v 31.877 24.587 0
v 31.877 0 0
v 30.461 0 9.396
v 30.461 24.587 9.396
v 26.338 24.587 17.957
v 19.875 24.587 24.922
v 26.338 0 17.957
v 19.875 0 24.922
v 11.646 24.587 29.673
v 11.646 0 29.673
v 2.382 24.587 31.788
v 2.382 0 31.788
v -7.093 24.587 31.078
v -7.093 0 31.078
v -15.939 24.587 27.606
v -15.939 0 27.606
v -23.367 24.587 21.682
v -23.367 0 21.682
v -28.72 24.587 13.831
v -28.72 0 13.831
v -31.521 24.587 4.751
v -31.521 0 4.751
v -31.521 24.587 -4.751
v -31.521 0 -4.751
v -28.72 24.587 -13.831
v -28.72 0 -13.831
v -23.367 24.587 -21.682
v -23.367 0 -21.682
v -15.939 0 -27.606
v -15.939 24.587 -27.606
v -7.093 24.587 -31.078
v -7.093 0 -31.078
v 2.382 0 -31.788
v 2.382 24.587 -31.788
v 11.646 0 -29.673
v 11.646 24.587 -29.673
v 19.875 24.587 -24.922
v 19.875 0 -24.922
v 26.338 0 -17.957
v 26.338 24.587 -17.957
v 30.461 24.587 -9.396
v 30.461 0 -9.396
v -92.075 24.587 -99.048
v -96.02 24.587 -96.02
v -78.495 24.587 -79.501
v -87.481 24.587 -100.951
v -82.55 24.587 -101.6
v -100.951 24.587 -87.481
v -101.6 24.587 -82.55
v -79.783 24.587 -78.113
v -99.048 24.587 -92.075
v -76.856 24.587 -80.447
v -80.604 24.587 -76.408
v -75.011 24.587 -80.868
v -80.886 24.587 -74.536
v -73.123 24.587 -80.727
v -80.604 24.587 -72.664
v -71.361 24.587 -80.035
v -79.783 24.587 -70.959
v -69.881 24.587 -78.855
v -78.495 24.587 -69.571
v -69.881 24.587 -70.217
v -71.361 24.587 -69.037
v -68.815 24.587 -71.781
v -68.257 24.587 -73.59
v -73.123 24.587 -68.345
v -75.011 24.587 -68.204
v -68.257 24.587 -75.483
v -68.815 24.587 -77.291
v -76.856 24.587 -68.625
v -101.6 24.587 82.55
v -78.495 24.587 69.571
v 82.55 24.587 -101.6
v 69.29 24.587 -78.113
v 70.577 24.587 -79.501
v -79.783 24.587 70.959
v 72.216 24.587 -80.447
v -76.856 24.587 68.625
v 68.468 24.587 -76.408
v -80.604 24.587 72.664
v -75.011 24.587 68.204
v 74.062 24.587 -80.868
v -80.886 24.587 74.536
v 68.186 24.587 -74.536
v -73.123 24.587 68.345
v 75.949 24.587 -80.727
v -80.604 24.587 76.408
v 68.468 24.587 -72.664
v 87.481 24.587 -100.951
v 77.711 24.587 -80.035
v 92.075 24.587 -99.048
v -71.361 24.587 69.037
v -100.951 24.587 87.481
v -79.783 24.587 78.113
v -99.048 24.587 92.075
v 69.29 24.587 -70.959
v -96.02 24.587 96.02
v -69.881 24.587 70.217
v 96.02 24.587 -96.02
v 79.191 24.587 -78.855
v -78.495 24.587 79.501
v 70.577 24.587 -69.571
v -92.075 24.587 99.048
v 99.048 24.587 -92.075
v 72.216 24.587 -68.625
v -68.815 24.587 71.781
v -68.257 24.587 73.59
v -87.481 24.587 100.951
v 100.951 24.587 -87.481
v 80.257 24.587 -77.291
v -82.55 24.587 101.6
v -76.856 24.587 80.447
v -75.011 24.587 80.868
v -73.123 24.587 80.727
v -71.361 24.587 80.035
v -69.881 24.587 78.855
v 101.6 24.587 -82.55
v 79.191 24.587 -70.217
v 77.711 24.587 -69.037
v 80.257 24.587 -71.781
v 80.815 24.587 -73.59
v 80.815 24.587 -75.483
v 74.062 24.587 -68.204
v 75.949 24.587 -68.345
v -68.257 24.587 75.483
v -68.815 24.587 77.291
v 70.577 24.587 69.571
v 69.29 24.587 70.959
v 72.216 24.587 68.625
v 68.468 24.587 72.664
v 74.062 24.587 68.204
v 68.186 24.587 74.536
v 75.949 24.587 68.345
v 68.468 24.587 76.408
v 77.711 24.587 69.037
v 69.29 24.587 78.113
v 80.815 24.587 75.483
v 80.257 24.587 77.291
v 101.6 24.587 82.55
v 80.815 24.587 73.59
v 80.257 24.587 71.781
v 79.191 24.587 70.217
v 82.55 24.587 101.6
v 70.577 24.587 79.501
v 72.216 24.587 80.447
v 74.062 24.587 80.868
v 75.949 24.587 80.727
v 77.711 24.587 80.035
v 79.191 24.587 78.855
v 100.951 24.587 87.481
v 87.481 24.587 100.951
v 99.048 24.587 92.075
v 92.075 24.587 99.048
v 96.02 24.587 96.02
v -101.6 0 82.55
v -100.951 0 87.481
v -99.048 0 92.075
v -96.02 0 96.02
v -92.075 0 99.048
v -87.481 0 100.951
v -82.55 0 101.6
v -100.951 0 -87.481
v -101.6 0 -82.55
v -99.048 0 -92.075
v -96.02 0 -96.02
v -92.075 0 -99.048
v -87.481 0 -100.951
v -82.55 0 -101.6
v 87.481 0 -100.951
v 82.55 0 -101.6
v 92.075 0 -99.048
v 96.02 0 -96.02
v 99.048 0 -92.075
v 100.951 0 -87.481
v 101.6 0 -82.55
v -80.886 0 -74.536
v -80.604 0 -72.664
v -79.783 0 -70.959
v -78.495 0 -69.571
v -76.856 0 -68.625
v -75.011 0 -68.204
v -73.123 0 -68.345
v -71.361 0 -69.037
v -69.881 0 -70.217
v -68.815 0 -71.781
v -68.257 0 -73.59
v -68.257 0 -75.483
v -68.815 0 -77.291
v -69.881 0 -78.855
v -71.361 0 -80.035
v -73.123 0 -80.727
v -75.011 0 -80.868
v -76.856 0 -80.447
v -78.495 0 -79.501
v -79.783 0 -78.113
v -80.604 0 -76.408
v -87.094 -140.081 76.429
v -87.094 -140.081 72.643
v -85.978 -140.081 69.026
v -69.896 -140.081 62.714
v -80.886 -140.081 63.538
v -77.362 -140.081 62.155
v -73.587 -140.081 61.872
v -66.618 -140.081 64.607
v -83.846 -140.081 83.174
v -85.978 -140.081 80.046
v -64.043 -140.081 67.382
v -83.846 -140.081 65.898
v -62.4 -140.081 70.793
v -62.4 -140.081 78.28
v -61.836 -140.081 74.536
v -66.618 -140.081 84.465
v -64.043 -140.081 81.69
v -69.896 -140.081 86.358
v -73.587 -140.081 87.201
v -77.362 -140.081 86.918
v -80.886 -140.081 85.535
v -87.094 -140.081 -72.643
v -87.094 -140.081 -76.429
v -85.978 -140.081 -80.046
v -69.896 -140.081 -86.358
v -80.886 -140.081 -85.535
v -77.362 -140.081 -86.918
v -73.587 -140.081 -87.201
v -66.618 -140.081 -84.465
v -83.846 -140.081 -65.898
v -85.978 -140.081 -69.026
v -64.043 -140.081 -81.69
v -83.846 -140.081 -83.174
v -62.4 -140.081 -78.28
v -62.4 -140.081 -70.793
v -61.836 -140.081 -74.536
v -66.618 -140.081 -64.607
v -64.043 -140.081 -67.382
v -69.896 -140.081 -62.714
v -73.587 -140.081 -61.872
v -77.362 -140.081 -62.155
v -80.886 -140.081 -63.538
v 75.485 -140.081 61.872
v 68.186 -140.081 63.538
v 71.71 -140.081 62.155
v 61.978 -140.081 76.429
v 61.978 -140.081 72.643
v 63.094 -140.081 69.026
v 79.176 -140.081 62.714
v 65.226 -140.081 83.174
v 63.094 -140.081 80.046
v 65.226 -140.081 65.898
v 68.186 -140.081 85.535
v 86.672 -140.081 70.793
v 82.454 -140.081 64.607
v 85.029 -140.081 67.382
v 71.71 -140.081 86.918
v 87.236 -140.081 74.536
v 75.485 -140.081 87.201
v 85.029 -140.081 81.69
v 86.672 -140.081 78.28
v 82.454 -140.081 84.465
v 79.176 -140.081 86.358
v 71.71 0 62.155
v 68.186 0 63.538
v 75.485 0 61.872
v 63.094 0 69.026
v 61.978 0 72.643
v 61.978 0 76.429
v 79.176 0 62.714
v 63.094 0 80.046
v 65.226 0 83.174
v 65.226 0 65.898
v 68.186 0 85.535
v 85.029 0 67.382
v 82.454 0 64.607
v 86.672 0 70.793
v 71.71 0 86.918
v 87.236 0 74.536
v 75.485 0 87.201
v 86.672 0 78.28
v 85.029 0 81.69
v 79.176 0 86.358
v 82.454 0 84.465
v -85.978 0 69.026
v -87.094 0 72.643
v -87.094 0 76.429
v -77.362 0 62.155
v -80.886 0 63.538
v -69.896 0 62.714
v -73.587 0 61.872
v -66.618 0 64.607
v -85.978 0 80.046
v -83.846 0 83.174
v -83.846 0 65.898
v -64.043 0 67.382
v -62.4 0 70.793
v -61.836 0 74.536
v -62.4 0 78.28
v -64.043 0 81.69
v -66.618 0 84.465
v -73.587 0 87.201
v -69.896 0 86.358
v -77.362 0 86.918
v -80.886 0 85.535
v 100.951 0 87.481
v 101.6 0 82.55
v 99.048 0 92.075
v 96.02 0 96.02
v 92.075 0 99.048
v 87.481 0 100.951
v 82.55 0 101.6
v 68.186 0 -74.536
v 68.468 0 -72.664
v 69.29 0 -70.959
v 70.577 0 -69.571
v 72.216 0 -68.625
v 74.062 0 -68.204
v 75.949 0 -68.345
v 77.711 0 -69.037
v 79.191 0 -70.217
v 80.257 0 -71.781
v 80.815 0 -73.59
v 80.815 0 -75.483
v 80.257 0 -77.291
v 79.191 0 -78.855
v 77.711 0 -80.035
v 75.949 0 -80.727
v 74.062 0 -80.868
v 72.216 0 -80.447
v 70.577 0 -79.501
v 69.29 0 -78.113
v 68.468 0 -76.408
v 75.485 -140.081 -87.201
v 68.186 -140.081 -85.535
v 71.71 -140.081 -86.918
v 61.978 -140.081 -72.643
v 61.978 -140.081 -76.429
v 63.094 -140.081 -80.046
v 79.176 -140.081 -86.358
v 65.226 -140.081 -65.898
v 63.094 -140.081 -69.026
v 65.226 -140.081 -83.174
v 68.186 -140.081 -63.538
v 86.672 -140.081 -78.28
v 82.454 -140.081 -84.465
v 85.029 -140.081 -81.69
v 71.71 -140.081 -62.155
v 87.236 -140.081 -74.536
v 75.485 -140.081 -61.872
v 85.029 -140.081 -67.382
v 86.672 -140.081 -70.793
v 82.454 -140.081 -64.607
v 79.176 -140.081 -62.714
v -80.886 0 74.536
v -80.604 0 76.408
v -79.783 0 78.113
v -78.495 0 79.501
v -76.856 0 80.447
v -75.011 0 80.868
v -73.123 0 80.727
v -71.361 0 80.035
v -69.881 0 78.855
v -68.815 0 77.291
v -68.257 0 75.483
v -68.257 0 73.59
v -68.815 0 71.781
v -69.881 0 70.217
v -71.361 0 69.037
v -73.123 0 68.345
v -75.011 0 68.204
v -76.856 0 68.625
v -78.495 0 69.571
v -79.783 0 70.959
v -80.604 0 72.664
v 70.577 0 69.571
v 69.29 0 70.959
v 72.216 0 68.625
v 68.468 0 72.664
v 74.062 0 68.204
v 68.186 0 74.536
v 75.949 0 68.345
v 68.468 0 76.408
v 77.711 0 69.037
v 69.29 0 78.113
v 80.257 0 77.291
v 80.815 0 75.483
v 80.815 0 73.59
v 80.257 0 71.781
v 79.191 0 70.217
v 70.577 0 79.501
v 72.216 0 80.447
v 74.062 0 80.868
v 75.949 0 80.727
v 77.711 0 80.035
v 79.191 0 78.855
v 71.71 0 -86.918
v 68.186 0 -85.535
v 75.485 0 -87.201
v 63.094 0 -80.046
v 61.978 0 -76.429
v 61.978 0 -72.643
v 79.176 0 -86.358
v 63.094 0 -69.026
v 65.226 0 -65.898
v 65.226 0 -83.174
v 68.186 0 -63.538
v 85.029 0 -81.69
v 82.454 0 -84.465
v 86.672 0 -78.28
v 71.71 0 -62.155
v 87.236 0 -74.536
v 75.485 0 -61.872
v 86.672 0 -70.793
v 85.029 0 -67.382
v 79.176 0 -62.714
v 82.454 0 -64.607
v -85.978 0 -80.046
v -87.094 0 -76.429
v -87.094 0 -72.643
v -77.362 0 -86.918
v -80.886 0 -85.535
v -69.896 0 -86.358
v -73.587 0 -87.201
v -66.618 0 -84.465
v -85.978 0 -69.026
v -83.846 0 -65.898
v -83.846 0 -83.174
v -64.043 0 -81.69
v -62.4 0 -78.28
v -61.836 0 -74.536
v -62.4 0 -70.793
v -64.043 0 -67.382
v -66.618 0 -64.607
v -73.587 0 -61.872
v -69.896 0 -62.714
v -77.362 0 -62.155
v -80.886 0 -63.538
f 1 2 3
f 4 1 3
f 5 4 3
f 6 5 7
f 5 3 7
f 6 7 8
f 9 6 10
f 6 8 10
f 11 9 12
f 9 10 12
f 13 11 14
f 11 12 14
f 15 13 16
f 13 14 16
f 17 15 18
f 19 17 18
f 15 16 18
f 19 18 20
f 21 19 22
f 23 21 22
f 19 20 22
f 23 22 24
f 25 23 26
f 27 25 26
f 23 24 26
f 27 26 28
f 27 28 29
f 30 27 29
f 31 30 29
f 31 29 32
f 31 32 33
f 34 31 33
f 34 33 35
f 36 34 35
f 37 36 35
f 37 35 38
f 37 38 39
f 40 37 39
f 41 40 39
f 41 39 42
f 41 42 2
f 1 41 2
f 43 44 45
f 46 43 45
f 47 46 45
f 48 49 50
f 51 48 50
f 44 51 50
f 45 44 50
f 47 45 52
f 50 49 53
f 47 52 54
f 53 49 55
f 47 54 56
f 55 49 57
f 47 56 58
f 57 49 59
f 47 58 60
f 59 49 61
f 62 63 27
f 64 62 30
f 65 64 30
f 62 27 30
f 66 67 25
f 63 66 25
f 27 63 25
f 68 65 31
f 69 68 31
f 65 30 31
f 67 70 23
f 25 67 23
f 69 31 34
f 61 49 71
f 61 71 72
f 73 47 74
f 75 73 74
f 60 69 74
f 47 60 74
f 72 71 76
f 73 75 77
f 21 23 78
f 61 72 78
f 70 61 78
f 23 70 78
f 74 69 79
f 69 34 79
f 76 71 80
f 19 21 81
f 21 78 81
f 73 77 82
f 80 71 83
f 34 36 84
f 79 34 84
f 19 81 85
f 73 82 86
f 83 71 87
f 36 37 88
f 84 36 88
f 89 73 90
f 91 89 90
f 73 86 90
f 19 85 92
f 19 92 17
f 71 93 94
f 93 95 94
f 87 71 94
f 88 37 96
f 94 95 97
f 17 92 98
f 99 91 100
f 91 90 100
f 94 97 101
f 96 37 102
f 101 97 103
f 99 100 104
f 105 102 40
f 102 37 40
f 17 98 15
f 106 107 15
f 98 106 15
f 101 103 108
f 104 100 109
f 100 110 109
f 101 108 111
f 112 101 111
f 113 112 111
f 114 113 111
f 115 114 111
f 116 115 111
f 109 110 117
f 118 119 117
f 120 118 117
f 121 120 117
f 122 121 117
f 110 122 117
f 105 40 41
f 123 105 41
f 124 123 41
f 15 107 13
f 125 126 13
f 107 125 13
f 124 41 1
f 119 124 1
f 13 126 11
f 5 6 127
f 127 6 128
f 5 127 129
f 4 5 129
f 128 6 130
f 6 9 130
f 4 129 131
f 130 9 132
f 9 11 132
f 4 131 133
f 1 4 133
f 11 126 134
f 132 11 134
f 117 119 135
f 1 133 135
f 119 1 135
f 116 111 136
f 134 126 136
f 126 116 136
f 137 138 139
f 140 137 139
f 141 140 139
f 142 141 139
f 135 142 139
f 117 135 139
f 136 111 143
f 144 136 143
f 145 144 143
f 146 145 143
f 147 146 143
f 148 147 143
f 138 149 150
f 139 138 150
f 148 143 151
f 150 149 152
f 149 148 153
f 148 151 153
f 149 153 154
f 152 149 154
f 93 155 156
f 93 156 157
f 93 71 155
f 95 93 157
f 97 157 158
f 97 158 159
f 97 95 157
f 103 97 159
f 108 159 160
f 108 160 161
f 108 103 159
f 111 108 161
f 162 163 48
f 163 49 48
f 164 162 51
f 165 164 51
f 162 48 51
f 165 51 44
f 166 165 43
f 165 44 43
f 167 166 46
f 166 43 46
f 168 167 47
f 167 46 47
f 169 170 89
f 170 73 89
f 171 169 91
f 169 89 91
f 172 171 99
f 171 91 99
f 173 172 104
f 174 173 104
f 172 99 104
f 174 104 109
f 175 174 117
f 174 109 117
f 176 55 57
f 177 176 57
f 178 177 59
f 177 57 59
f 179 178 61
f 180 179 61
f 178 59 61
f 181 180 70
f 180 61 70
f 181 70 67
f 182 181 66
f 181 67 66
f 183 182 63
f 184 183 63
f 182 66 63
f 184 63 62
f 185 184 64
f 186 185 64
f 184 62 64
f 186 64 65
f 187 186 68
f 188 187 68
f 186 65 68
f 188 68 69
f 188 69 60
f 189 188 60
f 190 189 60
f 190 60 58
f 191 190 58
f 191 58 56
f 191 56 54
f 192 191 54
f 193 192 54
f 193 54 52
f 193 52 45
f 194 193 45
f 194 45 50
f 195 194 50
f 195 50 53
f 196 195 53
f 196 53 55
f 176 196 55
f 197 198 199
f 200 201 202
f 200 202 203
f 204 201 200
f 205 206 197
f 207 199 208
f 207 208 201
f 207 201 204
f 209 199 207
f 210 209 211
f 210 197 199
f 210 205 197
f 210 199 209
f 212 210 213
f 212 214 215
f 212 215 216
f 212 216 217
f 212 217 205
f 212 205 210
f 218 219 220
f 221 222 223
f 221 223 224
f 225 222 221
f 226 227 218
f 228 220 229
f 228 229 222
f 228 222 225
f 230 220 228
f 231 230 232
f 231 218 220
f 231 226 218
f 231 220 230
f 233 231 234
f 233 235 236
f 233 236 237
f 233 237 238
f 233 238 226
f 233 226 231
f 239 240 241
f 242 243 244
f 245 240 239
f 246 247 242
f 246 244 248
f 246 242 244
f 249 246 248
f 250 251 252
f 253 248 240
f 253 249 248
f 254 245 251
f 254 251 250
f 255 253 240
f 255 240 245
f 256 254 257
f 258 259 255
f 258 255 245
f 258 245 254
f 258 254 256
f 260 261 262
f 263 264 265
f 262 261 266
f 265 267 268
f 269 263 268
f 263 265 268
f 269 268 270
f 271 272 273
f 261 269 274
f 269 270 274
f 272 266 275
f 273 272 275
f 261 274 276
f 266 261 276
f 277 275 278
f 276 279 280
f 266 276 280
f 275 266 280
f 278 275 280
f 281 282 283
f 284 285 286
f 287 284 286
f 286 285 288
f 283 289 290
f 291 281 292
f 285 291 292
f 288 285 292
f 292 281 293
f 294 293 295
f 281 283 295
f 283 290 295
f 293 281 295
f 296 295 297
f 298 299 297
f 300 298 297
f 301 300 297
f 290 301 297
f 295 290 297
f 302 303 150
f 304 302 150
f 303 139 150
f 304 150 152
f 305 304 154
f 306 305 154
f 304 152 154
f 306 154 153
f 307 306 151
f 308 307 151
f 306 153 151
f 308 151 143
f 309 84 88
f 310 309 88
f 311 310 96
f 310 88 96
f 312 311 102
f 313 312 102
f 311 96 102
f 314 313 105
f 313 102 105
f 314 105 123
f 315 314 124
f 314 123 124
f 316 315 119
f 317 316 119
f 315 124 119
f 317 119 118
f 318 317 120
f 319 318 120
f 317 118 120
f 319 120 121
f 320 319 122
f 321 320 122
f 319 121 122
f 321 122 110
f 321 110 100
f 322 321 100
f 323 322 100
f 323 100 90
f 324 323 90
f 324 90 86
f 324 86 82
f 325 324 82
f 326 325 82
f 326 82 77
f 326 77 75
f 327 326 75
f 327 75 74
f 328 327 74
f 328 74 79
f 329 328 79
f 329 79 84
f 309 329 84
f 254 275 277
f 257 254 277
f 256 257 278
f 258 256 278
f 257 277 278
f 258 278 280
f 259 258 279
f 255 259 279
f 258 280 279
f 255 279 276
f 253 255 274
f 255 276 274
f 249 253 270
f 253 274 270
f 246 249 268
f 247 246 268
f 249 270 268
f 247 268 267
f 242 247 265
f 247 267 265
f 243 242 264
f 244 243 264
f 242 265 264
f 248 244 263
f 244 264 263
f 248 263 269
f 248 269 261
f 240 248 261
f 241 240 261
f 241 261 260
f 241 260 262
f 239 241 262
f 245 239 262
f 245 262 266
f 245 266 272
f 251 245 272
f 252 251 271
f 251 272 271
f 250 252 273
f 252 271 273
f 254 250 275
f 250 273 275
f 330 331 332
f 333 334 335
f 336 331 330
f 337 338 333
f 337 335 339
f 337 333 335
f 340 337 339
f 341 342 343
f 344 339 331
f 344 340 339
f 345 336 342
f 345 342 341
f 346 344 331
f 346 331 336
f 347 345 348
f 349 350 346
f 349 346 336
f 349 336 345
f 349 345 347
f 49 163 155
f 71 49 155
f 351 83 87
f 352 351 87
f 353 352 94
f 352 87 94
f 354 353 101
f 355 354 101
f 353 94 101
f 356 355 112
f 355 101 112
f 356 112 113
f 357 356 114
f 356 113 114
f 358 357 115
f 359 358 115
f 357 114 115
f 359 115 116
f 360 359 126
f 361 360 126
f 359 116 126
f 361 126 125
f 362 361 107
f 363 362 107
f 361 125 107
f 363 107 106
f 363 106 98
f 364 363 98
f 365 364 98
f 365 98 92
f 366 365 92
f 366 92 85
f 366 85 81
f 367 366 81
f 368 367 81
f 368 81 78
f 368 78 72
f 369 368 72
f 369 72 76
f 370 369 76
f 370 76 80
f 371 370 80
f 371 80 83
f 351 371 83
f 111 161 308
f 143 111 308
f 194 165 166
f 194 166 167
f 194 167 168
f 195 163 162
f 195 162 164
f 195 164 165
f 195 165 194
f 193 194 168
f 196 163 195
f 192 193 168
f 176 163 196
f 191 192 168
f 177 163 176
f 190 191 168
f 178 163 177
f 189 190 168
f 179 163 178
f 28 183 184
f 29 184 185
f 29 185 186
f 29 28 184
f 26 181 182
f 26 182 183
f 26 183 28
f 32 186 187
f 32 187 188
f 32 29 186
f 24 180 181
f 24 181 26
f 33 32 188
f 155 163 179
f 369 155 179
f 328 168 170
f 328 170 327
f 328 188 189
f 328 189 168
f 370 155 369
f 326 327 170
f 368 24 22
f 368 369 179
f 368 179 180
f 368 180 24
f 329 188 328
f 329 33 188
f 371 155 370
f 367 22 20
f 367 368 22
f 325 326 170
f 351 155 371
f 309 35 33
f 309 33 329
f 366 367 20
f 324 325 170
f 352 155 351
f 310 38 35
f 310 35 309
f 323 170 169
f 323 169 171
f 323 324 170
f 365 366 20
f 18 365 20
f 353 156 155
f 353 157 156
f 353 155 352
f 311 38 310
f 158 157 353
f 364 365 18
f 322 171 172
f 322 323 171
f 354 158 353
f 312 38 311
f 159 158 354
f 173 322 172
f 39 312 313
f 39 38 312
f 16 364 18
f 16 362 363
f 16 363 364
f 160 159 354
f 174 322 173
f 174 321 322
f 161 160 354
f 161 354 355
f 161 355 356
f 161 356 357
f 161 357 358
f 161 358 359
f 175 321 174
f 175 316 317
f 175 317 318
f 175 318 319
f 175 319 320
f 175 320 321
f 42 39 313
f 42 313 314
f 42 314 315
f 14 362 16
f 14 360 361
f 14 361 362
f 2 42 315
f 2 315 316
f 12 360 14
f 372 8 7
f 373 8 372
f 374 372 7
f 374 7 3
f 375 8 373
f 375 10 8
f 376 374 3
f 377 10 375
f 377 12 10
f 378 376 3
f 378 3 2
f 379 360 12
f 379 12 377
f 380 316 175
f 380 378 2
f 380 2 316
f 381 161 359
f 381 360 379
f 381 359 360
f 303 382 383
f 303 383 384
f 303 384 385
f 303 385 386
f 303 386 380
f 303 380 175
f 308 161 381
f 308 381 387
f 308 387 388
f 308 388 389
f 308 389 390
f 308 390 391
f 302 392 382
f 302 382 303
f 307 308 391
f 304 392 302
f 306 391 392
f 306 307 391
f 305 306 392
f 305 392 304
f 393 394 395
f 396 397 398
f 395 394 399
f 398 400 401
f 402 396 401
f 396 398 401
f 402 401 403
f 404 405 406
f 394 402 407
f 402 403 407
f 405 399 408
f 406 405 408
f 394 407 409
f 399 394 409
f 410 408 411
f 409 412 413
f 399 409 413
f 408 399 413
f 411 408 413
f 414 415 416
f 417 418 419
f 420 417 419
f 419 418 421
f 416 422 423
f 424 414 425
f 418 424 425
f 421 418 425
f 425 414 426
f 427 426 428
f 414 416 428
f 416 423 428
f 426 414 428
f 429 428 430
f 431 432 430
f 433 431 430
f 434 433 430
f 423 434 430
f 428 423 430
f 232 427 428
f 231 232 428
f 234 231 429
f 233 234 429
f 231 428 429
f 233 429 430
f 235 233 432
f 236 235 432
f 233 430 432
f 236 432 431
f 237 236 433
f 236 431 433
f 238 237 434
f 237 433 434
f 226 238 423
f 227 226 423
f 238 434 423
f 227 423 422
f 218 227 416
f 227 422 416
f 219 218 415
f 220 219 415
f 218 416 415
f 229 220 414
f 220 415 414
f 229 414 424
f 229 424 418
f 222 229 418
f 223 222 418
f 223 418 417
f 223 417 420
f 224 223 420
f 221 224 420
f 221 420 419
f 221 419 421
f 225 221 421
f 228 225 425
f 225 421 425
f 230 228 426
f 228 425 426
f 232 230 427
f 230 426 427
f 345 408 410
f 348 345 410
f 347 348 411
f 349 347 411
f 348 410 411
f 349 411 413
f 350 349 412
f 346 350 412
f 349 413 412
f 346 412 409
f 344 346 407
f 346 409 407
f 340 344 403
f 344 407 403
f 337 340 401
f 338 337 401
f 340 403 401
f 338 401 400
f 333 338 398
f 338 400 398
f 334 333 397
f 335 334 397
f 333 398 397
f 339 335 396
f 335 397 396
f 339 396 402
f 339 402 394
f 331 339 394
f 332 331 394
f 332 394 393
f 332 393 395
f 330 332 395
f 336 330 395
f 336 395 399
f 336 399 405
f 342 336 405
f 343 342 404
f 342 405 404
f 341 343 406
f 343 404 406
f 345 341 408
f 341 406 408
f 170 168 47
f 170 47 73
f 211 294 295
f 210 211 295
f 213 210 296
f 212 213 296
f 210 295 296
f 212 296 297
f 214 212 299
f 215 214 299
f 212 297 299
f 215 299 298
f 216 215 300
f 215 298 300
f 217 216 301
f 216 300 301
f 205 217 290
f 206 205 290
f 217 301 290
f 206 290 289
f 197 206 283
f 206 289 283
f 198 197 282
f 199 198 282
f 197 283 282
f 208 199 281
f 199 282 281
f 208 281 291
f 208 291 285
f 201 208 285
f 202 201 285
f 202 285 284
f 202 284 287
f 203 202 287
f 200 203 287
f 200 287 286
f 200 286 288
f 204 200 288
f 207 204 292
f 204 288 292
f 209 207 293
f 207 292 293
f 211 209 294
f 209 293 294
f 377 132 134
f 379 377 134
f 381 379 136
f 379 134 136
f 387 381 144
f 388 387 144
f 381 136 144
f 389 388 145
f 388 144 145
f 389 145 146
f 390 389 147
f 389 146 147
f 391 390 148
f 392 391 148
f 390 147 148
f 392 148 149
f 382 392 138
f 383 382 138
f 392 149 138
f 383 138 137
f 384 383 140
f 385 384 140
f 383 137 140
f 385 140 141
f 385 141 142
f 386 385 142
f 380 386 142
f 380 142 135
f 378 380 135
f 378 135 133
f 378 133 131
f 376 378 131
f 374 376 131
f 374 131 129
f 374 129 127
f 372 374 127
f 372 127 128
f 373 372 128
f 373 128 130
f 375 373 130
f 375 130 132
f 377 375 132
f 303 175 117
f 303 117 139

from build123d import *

# Parameters (mm, degrees)
F0_W     = 203.2
F0_H     = 203.2
F1_DEPTH = 24.5872
F2_R     = 19.05
F3_R     = 31.877
F4_DEPTH = 24.5882
F6_D     = 12.7
F7_R     = 12.7
F8_DEPTH = 140.081


with BuildPart() as f1:
    # F0 (on Front) → F1 (new body)
    with BuildSketch(Plane.XZ):
        Rectangle(F0_W, F0_H)
    extrude(amount=-F1_DEPTH)

    # F2
    f2_edges = [f1.edges().sort_by_distance(p)[0] for p in [
        (-101.6, 12.2936, 101.6),
        (101.6, 12.2936, 101.6),
        (-101.6, 12.2936, -101.6),
        (101.6, 12.2936, -101.6),
    ]]
    fillet(f2_edges, radius=F2_R)

    # F3 (on face) → F4 (cut, through all)
    with BuildSketch(Plane.XZ):
        Circle(F3_R)
    extrude(amount=-F4_DEPTH, mode=Mode.SUBTRACT)

    # F6 (through all)
    with Locations(Plane.XZ):
        with Locations((-74.536126, 74.536126), (74.536126, 74.536126), (74.536126, -74.536126), (-74.536126, -74.536126)):
            Hole(F6_D / 2)


with BuildPart() as f8:
    # F7 (on face) → F8 (new body)
    with BuildSketch(Plane.XZ):
        with Locations((-74.536126, 74.536126)):
            Circle(F7_R)
        with Locations((-74.536126, -74.536126)):
            Circle(F7_R)
        with Locations((74.536126, -74.536126)):
            Circle(F7_R)
        with Locations((74.536126, 74.536126)):
            Circle(F7_R)
    extrude(amount=F8_DEPTH)


solid = Compound([f1.part, f8.part])
